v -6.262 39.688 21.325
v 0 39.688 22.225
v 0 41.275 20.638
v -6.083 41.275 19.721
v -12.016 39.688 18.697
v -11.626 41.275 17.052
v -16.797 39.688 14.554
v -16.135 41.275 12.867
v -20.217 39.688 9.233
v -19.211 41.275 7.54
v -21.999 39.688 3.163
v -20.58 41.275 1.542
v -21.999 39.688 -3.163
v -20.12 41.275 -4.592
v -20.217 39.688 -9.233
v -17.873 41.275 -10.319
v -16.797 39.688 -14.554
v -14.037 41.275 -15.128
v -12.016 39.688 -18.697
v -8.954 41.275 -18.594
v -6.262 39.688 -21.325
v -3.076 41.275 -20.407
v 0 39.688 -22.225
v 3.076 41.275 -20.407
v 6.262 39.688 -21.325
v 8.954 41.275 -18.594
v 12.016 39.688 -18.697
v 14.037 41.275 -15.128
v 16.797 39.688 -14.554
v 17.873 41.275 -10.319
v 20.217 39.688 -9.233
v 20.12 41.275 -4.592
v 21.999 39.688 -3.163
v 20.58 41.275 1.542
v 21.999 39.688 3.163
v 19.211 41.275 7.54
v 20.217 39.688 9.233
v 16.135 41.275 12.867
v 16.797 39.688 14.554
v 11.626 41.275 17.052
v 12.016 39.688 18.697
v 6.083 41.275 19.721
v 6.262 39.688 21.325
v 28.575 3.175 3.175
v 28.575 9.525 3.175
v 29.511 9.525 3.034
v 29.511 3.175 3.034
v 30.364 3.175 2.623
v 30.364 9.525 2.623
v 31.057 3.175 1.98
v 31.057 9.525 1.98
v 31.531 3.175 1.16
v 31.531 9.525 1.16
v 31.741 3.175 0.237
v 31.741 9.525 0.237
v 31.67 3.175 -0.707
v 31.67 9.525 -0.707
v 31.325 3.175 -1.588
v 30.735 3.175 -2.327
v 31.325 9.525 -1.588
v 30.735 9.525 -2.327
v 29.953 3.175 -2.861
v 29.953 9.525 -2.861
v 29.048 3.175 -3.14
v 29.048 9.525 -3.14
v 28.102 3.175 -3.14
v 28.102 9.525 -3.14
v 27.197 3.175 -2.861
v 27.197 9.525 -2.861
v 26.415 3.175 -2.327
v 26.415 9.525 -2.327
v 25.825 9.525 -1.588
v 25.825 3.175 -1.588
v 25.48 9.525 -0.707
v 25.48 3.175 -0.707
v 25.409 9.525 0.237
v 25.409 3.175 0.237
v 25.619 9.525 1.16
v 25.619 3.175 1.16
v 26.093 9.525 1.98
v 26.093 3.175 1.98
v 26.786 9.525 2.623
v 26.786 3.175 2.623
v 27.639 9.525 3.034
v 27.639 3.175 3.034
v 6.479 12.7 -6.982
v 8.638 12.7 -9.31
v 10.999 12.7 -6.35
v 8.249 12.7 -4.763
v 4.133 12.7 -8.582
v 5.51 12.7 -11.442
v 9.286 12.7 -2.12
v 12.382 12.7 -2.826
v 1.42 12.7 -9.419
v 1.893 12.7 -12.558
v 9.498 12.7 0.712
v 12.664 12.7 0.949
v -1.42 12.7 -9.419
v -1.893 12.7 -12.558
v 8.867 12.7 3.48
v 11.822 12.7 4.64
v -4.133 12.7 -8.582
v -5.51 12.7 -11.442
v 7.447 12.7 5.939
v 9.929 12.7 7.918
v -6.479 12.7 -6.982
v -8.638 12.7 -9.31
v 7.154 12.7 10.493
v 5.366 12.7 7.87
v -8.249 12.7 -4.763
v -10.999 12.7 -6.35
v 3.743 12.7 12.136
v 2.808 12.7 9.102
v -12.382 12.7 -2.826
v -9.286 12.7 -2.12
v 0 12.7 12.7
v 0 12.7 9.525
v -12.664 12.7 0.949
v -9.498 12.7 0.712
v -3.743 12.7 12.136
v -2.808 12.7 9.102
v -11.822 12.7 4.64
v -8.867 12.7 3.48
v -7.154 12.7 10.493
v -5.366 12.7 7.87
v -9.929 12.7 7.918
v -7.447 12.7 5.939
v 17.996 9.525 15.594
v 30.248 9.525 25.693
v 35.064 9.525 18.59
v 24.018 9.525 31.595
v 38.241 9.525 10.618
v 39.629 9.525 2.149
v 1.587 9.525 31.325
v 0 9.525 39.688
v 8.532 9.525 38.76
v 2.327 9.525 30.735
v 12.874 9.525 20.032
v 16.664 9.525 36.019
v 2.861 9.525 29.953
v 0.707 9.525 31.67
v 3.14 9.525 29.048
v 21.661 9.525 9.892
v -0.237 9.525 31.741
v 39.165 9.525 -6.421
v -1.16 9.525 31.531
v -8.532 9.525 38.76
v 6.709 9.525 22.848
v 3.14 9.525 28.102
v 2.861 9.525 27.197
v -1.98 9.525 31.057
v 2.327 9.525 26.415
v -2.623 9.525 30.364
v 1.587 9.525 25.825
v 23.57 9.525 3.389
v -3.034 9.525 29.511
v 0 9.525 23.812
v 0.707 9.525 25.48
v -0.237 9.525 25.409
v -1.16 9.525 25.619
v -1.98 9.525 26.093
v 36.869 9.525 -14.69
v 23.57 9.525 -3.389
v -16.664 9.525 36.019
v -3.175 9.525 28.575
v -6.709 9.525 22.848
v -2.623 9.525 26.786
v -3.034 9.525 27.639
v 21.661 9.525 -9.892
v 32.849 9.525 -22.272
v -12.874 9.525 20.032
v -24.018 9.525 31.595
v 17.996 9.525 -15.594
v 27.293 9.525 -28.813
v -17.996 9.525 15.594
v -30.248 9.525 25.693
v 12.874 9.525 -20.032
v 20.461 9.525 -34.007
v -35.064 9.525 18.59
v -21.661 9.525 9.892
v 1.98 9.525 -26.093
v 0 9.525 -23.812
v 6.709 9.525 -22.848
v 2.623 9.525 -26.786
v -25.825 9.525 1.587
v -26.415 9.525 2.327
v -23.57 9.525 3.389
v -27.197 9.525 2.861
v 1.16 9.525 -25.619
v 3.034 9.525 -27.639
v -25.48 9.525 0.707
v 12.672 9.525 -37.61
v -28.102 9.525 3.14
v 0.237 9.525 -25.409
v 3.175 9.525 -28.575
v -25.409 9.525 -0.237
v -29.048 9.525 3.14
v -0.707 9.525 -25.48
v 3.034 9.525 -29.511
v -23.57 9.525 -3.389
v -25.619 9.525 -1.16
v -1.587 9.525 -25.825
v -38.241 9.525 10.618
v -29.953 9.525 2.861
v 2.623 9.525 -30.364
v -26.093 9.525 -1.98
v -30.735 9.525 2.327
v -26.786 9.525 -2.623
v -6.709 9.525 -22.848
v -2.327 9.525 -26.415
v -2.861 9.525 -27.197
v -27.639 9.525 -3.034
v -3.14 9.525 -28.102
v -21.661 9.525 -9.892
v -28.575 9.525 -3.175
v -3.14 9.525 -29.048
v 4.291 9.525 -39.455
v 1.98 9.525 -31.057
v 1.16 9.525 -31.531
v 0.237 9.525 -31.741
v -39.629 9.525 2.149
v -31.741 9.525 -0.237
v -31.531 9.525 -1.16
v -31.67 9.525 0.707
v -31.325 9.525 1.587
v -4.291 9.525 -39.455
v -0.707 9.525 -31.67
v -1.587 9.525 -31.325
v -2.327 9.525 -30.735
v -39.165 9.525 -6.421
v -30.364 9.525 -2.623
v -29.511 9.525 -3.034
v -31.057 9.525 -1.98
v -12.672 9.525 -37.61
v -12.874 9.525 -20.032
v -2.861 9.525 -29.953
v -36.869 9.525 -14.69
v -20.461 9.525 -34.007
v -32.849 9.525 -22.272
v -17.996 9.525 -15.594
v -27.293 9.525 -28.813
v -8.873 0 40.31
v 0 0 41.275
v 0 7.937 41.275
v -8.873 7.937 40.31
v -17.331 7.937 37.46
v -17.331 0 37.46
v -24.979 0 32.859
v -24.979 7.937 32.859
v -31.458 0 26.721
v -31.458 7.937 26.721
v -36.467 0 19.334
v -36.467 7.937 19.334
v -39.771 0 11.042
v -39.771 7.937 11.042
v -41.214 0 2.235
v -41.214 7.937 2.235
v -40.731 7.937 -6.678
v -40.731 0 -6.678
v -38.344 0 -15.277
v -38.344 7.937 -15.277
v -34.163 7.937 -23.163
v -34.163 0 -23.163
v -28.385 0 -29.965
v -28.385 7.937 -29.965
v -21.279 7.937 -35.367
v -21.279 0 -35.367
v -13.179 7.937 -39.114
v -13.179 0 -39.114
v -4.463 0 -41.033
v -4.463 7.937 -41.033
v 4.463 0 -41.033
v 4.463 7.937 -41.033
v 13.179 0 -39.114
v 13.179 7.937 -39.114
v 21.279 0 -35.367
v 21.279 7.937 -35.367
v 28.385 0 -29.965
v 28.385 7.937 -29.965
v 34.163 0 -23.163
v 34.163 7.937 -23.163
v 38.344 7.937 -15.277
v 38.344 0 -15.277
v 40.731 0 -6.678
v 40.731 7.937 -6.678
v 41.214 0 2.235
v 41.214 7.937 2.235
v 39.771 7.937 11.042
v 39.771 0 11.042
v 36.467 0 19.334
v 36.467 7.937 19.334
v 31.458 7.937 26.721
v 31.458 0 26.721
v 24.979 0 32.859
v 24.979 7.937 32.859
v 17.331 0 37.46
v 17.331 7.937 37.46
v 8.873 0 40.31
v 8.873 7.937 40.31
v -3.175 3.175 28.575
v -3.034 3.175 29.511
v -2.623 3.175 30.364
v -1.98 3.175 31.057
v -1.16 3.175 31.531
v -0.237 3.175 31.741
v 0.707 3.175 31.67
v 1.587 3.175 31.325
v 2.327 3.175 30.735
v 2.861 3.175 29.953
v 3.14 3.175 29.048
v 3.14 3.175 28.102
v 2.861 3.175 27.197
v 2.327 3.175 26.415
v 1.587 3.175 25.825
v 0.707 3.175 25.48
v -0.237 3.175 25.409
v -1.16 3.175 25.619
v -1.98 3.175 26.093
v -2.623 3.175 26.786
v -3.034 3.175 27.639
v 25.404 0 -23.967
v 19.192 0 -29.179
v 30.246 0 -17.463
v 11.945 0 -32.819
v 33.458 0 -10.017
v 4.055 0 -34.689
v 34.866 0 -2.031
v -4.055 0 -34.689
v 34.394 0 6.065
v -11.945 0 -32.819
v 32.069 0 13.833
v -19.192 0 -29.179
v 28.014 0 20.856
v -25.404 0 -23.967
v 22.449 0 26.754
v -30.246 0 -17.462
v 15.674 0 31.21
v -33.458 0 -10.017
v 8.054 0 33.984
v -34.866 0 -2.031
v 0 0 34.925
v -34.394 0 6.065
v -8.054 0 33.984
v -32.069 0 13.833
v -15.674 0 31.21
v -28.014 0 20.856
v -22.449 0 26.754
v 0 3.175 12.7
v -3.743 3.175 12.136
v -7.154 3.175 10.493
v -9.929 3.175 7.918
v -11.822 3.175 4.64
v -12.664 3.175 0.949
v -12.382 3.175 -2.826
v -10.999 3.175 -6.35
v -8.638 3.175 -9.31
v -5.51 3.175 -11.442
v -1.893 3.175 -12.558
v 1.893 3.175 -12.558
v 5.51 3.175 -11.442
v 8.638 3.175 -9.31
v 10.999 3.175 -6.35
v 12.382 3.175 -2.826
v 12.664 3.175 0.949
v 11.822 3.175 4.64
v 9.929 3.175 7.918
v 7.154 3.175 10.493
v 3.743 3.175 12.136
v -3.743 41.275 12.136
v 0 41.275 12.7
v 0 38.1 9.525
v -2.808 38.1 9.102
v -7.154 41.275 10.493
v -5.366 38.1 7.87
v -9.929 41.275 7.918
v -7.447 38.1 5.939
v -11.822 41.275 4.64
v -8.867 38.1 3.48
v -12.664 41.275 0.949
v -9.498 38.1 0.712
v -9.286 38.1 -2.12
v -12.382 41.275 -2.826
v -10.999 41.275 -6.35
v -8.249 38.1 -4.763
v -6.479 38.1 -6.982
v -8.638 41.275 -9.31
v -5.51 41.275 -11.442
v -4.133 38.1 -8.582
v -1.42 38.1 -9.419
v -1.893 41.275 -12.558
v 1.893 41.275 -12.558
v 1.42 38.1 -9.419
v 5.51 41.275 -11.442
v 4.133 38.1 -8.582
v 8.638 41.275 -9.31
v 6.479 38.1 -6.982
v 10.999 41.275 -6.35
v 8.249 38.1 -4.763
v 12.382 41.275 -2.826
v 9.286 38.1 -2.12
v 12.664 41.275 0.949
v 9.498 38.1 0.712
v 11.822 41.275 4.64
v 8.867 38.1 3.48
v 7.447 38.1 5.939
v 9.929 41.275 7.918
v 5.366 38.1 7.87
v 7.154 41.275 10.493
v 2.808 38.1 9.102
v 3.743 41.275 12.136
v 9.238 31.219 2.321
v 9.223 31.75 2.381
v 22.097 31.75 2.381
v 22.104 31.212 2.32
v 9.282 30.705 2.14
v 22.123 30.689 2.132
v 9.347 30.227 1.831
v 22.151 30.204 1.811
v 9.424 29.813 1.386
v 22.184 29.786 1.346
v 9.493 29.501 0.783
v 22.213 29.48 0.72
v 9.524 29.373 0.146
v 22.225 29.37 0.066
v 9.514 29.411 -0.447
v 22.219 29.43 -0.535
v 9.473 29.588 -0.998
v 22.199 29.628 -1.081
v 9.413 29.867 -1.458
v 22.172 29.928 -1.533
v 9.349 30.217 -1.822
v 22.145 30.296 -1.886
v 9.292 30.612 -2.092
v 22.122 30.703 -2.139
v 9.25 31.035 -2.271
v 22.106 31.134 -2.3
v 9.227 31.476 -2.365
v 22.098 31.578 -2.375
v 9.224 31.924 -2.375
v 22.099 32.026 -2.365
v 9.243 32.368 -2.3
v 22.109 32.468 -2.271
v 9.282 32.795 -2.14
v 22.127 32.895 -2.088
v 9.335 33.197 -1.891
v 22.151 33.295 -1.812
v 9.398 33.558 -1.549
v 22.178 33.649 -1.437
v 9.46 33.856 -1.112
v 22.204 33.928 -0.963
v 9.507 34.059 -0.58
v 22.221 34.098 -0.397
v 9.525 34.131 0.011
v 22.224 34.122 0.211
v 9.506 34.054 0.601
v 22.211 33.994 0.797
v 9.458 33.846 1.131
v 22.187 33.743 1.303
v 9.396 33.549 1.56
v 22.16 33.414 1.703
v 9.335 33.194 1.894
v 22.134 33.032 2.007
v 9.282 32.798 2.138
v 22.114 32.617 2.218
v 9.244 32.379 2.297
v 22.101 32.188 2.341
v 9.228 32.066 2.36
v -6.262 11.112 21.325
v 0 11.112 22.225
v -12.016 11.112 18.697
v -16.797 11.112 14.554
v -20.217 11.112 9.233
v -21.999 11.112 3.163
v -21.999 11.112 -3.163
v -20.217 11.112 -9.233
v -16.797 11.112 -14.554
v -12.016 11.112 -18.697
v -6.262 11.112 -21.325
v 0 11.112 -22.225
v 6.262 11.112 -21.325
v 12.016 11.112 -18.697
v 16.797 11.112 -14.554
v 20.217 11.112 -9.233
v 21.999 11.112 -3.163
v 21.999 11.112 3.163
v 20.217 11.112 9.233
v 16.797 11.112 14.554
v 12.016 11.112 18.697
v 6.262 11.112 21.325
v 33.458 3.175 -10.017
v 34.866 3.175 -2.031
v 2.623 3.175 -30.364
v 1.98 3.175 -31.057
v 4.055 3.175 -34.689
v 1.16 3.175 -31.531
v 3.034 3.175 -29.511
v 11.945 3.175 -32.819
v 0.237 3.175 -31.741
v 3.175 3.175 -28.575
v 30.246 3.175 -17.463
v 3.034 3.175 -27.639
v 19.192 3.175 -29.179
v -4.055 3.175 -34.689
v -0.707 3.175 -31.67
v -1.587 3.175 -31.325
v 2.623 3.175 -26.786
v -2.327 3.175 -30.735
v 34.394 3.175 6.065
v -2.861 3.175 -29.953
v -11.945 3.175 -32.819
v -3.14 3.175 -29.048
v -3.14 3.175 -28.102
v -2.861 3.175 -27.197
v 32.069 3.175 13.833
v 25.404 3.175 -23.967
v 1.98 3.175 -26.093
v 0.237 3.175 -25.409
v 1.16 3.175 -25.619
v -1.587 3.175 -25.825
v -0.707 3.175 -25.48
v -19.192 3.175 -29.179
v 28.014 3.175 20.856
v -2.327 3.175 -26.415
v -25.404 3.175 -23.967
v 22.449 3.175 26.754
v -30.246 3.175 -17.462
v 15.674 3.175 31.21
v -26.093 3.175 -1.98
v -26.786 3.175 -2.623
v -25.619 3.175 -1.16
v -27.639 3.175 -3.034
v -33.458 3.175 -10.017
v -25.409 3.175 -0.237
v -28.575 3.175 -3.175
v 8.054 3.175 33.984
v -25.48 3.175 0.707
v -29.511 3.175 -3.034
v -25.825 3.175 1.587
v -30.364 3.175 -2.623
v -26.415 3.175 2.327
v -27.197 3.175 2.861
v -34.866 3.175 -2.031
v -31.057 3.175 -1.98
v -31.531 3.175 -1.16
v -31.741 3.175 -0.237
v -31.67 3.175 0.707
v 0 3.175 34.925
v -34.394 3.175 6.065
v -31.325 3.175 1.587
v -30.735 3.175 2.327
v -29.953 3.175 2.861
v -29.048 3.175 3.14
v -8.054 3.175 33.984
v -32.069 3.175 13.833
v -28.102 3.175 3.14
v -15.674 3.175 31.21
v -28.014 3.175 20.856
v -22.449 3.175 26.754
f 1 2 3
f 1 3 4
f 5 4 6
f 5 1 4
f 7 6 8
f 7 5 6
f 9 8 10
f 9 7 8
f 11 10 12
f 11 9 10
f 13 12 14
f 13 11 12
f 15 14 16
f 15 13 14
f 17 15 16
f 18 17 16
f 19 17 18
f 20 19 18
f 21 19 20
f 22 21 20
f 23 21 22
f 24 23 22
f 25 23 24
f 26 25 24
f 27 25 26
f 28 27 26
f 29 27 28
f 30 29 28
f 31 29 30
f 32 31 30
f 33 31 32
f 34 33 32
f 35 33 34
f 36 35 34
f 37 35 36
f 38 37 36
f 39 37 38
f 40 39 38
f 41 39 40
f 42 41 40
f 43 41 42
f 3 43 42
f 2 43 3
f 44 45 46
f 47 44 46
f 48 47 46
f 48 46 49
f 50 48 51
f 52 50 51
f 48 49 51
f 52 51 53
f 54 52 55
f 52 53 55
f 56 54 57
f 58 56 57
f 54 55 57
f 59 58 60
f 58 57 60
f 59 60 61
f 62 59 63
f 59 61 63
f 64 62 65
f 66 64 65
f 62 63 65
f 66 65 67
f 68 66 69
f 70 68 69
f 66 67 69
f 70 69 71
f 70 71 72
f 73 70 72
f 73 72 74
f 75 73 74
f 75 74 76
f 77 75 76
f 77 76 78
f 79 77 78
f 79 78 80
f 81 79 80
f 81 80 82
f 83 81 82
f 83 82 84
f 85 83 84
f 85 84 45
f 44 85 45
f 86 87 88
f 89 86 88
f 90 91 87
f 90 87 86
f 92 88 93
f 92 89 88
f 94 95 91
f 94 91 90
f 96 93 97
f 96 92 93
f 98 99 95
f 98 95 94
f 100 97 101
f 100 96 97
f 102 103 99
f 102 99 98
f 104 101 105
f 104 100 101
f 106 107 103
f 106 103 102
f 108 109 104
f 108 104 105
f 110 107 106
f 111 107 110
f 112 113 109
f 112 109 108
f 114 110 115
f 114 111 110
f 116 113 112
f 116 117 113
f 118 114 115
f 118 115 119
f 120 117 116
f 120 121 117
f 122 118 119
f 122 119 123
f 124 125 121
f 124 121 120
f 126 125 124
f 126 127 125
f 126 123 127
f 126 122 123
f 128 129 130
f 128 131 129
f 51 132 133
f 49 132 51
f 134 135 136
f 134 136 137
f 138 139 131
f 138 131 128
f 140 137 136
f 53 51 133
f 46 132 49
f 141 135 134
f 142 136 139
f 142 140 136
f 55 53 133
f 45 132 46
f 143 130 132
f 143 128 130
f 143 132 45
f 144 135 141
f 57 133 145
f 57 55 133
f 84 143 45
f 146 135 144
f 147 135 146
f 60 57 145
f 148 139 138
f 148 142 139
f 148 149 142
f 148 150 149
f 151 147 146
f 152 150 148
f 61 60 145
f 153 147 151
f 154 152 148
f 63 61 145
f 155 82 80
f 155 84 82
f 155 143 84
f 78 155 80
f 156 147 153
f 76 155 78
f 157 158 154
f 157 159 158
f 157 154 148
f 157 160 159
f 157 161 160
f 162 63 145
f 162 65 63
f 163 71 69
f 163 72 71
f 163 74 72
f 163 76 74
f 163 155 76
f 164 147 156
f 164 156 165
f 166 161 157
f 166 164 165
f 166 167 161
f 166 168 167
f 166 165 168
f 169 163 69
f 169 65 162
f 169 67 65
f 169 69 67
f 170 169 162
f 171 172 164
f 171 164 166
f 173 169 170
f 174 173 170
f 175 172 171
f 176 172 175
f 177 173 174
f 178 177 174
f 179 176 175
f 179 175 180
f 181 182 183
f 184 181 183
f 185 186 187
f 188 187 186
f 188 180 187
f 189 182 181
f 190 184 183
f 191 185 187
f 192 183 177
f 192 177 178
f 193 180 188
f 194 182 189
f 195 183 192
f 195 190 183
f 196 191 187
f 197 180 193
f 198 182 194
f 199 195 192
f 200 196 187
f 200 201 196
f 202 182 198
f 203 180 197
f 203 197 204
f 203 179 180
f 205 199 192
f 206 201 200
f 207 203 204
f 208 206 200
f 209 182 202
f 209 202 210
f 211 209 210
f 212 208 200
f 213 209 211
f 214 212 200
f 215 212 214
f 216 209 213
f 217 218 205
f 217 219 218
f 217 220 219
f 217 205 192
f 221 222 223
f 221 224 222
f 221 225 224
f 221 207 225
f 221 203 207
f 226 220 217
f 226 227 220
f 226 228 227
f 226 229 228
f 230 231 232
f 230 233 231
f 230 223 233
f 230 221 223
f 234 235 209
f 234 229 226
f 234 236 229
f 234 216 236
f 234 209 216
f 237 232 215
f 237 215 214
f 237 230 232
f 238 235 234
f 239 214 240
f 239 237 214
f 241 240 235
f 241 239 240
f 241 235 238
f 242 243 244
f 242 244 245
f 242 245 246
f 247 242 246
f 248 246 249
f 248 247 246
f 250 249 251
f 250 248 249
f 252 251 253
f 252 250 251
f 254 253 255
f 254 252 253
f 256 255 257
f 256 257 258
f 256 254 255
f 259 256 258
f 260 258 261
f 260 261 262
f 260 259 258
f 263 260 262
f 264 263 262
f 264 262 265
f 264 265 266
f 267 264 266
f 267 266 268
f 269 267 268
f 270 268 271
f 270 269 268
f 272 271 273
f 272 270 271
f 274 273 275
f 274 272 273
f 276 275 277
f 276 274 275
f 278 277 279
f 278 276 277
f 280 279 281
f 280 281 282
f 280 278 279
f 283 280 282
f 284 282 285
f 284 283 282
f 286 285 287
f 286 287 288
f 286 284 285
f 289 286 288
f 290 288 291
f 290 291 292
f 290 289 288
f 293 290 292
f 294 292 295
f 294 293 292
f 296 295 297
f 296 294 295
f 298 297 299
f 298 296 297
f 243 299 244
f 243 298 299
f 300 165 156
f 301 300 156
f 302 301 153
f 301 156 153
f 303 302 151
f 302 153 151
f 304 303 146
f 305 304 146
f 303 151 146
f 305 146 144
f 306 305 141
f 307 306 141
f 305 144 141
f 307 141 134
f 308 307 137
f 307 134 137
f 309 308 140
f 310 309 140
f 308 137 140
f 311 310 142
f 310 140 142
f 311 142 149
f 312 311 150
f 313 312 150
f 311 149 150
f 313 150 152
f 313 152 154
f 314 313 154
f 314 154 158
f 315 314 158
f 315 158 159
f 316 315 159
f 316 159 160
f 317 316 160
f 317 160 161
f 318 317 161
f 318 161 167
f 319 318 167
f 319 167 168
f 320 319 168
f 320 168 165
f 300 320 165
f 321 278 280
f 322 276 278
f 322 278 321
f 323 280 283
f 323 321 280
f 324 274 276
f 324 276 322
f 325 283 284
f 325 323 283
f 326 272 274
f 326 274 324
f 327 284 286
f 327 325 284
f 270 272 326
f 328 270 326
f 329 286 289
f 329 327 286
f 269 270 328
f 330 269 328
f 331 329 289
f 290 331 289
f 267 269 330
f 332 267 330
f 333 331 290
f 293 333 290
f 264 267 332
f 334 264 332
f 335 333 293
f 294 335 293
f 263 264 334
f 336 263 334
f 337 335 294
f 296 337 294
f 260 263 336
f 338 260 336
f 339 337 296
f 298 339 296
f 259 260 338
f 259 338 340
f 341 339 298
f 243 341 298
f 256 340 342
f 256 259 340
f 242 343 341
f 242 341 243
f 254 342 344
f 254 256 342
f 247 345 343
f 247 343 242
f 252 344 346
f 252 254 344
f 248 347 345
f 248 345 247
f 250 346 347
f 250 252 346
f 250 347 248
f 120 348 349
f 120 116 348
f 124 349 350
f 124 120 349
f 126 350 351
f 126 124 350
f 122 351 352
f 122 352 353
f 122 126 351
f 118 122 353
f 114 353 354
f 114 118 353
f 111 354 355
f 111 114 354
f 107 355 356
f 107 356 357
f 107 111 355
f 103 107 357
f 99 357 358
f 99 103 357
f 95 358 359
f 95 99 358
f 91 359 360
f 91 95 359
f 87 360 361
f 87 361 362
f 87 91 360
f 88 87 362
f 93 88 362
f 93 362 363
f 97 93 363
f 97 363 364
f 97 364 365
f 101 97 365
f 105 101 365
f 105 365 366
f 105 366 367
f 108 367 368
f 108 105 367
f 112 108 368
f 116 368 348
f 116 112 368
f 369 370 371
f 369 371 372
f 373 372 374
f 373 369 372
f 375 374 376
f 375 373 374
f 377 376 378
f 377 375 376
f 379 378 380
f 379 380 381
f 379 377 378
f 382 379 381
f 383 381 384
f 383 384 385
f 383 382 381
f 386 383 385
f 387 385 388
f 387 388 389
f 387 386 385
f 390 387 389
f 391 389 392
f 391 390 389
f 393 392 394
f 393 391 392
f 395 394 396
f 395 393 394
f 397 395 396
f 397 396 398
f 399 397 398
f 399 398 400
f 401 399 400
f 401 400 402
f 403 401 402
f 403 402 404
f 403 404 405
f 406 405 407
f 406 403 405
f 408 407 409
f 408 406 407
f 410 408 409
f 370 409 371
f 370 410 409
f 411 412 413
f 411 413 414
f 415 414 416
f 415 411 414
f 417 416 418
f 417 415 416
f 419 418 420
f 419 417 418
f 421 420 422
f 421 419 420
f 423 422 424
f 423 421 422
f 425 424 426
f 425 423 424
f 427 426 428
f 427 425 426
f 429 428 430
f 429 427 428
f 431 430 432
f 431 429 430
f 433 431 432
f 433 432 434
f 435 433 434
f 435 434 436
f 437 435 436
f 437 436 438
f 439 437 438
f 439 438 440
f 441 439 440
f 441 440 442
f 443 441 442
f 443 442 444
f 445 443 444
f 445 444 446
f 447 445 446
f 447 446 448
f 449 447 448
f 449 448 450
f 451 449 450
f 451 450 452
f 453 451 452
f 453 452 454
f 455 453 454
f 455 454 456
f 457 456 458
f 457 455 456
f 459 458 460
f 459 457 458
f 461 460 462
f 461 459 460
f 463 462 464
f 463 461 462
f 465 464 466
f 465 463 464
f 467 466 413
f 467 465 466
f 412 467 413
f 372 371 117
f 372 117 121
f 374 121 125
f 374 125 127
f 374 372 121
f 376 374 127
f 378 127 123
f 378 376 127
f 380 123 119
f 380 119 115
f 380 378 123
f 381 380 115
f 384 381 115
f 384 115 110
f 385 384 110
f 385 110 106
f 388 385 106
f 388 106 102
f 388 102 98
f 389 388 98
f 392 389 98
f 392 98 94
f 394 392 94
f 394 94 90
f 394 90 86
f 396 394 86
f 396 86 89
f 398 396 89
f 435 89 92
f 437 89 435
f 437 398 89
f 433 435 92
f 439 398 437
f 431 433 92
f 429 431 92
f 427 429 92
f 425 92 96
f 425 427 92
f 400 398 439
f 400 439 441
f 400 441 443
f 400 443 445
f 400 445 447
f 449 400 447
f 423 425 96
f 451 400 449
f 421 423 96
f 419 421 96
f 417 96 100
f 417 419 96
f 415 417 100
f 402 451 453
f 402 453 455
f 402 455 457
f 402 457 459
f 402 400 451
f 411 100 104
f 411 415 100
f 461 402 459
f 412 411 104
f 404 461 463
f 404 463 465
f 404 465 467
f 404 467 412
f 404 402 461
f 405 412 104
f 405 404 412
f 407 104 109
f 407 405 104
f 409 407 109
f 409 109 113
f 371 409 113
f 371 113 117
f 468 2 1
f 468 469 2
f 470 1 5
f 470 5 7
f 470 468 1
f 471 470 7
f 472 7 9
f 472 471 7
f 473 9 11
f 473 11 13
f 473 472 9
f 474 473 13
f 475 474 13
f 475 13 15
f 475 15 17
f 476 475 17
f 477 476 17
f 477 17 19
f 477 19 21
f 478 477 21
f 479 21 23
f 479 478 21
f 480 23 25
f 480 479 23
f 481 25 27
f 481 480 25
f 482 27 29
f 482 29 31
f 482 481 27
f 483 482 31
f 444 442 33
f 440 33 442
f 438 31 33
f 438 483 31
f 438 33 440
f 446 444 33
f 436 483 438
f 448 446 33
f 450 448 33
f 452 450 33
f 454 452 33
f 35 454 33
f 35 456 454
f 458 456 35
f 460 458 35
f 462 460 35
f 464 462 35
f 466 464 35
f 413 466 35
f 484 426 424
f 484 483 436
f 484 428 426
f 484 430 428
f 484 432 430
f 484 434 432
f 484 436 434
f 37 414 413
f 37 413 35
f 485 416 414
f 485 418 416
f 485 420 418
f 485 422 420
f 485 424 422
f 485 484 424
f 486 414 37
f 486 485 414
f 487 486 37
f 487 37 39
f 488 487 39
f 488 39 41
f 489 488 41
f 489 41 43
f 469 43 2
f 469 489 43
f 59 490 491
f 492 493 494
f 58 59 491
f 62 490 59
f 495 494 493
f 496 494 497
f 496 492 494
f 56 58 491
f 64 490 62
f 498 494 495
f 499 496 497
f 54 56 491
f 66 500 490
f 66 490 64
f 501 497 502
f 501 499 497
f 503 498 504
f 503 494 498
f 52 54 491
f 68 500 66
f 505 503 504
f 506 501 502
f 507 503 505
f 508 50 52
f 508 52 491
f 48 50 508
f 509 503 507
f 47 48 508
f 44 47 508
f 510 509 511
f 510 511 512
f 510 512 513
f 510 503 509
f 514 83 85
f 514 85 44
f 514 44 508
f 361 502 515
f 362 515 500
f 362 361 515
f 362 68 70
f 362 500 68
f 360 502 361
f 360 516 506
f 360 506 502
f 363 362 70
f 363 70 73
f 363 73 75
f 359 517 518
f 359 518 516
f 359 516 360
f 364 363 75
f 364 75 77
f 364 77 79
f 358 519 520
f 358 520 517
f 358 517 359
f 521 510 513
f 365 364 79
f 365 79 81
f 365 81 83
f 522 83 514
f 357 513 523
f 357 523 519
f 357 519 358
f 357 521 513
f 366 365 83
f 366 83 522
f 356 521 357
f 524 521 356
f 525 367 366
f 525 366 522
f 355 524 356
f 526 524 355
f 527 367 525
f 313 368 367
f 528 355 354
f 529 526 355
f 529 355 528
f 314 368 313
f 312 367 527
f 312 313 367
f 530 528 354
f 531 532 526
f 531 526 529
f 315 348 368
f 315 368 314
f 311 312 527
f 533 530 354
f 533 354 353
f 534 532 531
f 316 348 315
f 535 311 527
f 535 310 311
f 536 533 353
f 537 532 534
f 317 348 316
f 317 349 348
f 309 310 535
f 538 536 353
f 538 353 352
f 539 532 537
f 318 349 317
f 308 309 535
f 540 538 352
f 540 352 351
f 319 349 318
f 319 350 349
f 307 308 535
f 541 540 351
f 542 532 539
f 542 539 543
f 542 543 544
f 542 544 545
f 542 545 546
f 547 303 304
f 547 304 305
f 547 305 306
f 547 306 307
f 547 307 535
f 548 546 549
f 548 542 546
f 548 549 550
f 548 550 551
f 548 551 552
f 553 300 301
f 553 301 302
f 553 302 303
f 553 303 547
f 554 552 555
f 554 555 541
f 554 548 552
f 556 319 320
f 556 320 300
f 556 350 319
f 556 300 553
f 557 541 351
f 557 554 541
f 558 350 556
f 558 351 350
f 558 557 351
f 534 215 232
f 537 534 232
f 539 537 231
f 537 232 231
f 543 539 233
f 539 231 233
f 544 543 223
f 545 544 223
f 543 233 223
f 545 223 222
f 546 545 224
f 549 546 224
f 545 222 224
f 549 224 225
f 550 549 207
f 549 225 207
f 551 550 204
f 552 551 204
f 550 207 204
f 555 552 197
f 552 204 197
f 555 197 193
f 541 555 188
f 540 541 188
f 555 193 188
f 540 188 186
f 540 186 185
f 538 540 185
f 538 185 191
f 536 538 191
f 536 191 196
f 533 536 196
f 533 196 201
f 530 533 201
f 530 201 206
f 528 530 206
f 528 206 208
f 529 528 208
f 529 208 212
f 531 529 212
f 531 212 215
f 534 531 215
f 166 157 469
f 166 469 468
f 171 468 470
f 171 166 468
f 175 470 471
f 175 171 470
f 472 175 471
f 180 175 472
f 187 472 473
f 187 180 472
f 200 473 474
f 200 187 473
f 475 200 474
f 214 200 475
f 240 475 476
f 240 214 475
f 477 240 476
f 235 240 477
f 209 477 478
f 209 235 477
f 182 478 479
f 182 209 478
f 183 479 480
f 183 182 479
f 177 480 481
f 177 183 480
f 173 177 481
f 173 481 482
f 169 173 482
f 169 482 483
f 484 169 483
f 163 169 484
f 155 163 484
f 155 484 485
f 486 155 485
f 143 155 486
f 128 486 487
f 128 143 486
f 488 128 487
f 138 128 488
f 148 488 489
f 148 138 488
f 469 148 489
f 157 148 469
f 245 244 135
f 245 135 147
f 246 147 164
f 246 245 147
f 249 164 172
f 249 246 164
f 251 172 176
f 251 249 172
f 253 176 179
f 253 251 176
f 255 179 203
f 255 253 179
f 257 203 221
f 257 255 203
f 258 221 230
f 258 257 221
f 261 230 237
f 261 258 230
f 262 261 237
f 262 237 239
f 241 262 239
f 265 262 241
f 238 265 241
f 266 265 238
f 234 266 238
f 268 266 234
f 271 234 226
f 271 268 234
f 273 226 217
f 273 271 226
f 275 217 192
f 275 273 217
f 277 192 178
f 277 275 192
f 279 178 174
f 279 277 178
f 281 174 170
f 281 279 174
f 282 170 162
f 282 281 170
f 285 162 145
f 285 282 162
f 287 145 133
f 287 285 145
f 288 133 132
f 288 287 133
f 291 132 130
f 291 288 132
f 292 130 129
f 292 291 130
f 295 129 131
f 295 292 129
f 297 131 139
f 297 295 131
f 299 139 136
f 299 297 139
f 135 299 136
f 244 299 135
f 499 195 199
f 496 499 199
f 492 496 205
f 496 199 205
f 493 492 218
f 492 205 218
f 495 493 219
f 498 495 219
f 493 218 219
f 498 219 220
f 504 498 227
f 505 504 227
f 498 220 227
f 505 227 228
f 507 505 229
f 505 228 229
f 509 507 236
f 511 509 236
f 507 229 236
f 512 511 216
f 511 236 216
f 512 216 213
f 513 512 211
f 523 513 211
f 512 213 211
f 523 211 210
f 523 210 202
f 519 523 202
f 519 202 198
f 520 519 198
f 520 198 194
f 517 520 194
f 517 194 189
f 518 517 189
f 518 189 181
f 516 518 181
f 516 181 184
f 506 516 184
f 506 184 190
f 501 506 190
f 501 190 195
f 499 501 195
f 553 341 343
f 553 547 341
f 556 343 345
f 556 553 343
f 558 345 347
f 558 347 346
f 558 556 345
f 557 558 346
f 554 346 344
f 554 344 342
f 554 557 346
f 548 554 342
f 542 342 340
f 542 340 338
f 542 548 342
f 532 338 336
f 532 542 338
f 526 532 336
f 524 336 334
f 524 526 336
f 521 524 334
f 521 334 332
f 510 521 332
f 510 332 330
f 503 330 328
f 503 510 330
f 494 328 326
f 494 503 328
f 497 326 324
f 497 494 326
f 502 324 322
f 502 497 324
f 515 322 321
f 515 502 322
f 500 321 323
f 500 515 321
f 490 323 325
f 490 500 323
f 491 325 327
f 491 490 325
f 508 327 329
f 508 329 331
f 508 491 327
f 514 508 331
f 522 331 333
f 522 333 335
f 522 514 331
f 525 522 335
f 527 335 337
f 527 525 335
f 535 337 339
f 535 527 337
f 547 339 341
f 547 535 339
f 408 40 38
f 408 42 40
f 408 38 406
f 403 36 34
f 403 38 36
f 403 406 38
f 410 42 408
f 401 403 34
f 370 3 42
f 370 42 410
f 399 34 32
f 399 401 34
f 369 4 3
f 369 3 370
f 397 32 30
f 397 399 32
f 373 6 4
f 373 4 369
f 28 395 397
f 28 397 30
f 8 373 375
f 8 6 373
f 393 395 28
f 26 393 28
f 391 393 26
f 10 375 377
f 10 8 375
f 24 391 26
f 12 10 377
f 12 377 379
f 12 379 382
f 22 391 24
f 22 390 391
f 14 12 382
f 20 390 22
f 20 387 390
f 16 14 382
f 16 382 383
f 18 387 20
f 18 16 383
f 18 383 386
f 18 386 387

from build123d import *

# Parameters (mm, degrees)
CHAMFER1_SIZE      = 3.175
CHAMFER2_SIZE      = 1.5875
SKETCH2_R          = 3.175
CUT_EXTRUDE2_DEPTH = 72.490397082
CIRPATTERN2_COUNT  = 4
SKETCH3_R          = 2.38125
CUT_EXTRUDE3_DEPTH = 72.490397082


with BuildPart() as part:
    # Sketch1 → Revolve1 (revolve)
    with BuildSketch(Plane.XY, mode=Mode.PRIVATE) as revolve1_sk:
        Polygon((34.925, 0), (34.925, 3.175), (12.7, 3.175), (12.7, 12.7), (9.525, 12.7), (9.525, 41.275), (22.225, 41.275), (22.225, 9.525), (41.275, 9.525), (41.275, 0), align=None)
    revolve(revolve1_sk.sketch.rotate(Axis((0, 48.361075519, 0), (0, -1, 0)), 90), axis=Axis((0, 48.361075519, 0), (0, -1, 0)))

    # Chamfer1
    chamfer1_edges = [part.edges().sort_by_distance(p)[0] for p in [
        (0, 41.275, -9.525),
    ]]
    chamfer(chamfer1_edges, length=CHAMFER1_SIZE)

    # Chamfer2
    chamfer2_edges = [part.edges().sort_by_distance(p)[0] for p in [
        (0, 9.525, -41.275),
        (0, 9.525, -22.225),
        (0, 41.275, -22.225),
    ]]
    chamfer(chamfer2_edges, length=CHAMFER2_SIZE)

    # Sketch2 → Cut-Extrude2 (cut, through all)
    with BuildSketch(Plane(origin=(0, 41.275, 0), x_dir=(1, 0, 0), z_dir=(0, 1, 0))):
        with Locations(Location((28.575, 0, 0), (0, 0, 270))):
            Circle(SKETCH2_R)
    cut_extrude2 = extrude(amount=-CUT_EXTRUDE2_DEPTH, mode=Mode.SUBTRACT)

    # CirPattern2: Cut-Extrude2 ×4 about axis
    cirpattern2_axis = Axis((0, 0, 0), (0, 1, 0))
    for i in range(1, CIRPATTERN2_COUNT):
        add(cut_extrude2.rotate(cirpattern2_axis, i * 360 / CIRPATTERN2_COUNT), mode=Mode.SUBTRACT)

    # Sketch3 → Cut-Extrude3 (cut, through all)
    with BuildSketch(Plane(origin=(0, 0, 0), x_dir=(0, 0, -1), z_dir=(1, 0, 0))):
        with Locations(Location((0, 31.75, 0), (0, 0, 180))):
            Circle(SKETCH3_R)
    extrude(amount=CUT_EXTRUDE3_DEPTH, mode=Mode.SUBTRACT)


solid = part.part
